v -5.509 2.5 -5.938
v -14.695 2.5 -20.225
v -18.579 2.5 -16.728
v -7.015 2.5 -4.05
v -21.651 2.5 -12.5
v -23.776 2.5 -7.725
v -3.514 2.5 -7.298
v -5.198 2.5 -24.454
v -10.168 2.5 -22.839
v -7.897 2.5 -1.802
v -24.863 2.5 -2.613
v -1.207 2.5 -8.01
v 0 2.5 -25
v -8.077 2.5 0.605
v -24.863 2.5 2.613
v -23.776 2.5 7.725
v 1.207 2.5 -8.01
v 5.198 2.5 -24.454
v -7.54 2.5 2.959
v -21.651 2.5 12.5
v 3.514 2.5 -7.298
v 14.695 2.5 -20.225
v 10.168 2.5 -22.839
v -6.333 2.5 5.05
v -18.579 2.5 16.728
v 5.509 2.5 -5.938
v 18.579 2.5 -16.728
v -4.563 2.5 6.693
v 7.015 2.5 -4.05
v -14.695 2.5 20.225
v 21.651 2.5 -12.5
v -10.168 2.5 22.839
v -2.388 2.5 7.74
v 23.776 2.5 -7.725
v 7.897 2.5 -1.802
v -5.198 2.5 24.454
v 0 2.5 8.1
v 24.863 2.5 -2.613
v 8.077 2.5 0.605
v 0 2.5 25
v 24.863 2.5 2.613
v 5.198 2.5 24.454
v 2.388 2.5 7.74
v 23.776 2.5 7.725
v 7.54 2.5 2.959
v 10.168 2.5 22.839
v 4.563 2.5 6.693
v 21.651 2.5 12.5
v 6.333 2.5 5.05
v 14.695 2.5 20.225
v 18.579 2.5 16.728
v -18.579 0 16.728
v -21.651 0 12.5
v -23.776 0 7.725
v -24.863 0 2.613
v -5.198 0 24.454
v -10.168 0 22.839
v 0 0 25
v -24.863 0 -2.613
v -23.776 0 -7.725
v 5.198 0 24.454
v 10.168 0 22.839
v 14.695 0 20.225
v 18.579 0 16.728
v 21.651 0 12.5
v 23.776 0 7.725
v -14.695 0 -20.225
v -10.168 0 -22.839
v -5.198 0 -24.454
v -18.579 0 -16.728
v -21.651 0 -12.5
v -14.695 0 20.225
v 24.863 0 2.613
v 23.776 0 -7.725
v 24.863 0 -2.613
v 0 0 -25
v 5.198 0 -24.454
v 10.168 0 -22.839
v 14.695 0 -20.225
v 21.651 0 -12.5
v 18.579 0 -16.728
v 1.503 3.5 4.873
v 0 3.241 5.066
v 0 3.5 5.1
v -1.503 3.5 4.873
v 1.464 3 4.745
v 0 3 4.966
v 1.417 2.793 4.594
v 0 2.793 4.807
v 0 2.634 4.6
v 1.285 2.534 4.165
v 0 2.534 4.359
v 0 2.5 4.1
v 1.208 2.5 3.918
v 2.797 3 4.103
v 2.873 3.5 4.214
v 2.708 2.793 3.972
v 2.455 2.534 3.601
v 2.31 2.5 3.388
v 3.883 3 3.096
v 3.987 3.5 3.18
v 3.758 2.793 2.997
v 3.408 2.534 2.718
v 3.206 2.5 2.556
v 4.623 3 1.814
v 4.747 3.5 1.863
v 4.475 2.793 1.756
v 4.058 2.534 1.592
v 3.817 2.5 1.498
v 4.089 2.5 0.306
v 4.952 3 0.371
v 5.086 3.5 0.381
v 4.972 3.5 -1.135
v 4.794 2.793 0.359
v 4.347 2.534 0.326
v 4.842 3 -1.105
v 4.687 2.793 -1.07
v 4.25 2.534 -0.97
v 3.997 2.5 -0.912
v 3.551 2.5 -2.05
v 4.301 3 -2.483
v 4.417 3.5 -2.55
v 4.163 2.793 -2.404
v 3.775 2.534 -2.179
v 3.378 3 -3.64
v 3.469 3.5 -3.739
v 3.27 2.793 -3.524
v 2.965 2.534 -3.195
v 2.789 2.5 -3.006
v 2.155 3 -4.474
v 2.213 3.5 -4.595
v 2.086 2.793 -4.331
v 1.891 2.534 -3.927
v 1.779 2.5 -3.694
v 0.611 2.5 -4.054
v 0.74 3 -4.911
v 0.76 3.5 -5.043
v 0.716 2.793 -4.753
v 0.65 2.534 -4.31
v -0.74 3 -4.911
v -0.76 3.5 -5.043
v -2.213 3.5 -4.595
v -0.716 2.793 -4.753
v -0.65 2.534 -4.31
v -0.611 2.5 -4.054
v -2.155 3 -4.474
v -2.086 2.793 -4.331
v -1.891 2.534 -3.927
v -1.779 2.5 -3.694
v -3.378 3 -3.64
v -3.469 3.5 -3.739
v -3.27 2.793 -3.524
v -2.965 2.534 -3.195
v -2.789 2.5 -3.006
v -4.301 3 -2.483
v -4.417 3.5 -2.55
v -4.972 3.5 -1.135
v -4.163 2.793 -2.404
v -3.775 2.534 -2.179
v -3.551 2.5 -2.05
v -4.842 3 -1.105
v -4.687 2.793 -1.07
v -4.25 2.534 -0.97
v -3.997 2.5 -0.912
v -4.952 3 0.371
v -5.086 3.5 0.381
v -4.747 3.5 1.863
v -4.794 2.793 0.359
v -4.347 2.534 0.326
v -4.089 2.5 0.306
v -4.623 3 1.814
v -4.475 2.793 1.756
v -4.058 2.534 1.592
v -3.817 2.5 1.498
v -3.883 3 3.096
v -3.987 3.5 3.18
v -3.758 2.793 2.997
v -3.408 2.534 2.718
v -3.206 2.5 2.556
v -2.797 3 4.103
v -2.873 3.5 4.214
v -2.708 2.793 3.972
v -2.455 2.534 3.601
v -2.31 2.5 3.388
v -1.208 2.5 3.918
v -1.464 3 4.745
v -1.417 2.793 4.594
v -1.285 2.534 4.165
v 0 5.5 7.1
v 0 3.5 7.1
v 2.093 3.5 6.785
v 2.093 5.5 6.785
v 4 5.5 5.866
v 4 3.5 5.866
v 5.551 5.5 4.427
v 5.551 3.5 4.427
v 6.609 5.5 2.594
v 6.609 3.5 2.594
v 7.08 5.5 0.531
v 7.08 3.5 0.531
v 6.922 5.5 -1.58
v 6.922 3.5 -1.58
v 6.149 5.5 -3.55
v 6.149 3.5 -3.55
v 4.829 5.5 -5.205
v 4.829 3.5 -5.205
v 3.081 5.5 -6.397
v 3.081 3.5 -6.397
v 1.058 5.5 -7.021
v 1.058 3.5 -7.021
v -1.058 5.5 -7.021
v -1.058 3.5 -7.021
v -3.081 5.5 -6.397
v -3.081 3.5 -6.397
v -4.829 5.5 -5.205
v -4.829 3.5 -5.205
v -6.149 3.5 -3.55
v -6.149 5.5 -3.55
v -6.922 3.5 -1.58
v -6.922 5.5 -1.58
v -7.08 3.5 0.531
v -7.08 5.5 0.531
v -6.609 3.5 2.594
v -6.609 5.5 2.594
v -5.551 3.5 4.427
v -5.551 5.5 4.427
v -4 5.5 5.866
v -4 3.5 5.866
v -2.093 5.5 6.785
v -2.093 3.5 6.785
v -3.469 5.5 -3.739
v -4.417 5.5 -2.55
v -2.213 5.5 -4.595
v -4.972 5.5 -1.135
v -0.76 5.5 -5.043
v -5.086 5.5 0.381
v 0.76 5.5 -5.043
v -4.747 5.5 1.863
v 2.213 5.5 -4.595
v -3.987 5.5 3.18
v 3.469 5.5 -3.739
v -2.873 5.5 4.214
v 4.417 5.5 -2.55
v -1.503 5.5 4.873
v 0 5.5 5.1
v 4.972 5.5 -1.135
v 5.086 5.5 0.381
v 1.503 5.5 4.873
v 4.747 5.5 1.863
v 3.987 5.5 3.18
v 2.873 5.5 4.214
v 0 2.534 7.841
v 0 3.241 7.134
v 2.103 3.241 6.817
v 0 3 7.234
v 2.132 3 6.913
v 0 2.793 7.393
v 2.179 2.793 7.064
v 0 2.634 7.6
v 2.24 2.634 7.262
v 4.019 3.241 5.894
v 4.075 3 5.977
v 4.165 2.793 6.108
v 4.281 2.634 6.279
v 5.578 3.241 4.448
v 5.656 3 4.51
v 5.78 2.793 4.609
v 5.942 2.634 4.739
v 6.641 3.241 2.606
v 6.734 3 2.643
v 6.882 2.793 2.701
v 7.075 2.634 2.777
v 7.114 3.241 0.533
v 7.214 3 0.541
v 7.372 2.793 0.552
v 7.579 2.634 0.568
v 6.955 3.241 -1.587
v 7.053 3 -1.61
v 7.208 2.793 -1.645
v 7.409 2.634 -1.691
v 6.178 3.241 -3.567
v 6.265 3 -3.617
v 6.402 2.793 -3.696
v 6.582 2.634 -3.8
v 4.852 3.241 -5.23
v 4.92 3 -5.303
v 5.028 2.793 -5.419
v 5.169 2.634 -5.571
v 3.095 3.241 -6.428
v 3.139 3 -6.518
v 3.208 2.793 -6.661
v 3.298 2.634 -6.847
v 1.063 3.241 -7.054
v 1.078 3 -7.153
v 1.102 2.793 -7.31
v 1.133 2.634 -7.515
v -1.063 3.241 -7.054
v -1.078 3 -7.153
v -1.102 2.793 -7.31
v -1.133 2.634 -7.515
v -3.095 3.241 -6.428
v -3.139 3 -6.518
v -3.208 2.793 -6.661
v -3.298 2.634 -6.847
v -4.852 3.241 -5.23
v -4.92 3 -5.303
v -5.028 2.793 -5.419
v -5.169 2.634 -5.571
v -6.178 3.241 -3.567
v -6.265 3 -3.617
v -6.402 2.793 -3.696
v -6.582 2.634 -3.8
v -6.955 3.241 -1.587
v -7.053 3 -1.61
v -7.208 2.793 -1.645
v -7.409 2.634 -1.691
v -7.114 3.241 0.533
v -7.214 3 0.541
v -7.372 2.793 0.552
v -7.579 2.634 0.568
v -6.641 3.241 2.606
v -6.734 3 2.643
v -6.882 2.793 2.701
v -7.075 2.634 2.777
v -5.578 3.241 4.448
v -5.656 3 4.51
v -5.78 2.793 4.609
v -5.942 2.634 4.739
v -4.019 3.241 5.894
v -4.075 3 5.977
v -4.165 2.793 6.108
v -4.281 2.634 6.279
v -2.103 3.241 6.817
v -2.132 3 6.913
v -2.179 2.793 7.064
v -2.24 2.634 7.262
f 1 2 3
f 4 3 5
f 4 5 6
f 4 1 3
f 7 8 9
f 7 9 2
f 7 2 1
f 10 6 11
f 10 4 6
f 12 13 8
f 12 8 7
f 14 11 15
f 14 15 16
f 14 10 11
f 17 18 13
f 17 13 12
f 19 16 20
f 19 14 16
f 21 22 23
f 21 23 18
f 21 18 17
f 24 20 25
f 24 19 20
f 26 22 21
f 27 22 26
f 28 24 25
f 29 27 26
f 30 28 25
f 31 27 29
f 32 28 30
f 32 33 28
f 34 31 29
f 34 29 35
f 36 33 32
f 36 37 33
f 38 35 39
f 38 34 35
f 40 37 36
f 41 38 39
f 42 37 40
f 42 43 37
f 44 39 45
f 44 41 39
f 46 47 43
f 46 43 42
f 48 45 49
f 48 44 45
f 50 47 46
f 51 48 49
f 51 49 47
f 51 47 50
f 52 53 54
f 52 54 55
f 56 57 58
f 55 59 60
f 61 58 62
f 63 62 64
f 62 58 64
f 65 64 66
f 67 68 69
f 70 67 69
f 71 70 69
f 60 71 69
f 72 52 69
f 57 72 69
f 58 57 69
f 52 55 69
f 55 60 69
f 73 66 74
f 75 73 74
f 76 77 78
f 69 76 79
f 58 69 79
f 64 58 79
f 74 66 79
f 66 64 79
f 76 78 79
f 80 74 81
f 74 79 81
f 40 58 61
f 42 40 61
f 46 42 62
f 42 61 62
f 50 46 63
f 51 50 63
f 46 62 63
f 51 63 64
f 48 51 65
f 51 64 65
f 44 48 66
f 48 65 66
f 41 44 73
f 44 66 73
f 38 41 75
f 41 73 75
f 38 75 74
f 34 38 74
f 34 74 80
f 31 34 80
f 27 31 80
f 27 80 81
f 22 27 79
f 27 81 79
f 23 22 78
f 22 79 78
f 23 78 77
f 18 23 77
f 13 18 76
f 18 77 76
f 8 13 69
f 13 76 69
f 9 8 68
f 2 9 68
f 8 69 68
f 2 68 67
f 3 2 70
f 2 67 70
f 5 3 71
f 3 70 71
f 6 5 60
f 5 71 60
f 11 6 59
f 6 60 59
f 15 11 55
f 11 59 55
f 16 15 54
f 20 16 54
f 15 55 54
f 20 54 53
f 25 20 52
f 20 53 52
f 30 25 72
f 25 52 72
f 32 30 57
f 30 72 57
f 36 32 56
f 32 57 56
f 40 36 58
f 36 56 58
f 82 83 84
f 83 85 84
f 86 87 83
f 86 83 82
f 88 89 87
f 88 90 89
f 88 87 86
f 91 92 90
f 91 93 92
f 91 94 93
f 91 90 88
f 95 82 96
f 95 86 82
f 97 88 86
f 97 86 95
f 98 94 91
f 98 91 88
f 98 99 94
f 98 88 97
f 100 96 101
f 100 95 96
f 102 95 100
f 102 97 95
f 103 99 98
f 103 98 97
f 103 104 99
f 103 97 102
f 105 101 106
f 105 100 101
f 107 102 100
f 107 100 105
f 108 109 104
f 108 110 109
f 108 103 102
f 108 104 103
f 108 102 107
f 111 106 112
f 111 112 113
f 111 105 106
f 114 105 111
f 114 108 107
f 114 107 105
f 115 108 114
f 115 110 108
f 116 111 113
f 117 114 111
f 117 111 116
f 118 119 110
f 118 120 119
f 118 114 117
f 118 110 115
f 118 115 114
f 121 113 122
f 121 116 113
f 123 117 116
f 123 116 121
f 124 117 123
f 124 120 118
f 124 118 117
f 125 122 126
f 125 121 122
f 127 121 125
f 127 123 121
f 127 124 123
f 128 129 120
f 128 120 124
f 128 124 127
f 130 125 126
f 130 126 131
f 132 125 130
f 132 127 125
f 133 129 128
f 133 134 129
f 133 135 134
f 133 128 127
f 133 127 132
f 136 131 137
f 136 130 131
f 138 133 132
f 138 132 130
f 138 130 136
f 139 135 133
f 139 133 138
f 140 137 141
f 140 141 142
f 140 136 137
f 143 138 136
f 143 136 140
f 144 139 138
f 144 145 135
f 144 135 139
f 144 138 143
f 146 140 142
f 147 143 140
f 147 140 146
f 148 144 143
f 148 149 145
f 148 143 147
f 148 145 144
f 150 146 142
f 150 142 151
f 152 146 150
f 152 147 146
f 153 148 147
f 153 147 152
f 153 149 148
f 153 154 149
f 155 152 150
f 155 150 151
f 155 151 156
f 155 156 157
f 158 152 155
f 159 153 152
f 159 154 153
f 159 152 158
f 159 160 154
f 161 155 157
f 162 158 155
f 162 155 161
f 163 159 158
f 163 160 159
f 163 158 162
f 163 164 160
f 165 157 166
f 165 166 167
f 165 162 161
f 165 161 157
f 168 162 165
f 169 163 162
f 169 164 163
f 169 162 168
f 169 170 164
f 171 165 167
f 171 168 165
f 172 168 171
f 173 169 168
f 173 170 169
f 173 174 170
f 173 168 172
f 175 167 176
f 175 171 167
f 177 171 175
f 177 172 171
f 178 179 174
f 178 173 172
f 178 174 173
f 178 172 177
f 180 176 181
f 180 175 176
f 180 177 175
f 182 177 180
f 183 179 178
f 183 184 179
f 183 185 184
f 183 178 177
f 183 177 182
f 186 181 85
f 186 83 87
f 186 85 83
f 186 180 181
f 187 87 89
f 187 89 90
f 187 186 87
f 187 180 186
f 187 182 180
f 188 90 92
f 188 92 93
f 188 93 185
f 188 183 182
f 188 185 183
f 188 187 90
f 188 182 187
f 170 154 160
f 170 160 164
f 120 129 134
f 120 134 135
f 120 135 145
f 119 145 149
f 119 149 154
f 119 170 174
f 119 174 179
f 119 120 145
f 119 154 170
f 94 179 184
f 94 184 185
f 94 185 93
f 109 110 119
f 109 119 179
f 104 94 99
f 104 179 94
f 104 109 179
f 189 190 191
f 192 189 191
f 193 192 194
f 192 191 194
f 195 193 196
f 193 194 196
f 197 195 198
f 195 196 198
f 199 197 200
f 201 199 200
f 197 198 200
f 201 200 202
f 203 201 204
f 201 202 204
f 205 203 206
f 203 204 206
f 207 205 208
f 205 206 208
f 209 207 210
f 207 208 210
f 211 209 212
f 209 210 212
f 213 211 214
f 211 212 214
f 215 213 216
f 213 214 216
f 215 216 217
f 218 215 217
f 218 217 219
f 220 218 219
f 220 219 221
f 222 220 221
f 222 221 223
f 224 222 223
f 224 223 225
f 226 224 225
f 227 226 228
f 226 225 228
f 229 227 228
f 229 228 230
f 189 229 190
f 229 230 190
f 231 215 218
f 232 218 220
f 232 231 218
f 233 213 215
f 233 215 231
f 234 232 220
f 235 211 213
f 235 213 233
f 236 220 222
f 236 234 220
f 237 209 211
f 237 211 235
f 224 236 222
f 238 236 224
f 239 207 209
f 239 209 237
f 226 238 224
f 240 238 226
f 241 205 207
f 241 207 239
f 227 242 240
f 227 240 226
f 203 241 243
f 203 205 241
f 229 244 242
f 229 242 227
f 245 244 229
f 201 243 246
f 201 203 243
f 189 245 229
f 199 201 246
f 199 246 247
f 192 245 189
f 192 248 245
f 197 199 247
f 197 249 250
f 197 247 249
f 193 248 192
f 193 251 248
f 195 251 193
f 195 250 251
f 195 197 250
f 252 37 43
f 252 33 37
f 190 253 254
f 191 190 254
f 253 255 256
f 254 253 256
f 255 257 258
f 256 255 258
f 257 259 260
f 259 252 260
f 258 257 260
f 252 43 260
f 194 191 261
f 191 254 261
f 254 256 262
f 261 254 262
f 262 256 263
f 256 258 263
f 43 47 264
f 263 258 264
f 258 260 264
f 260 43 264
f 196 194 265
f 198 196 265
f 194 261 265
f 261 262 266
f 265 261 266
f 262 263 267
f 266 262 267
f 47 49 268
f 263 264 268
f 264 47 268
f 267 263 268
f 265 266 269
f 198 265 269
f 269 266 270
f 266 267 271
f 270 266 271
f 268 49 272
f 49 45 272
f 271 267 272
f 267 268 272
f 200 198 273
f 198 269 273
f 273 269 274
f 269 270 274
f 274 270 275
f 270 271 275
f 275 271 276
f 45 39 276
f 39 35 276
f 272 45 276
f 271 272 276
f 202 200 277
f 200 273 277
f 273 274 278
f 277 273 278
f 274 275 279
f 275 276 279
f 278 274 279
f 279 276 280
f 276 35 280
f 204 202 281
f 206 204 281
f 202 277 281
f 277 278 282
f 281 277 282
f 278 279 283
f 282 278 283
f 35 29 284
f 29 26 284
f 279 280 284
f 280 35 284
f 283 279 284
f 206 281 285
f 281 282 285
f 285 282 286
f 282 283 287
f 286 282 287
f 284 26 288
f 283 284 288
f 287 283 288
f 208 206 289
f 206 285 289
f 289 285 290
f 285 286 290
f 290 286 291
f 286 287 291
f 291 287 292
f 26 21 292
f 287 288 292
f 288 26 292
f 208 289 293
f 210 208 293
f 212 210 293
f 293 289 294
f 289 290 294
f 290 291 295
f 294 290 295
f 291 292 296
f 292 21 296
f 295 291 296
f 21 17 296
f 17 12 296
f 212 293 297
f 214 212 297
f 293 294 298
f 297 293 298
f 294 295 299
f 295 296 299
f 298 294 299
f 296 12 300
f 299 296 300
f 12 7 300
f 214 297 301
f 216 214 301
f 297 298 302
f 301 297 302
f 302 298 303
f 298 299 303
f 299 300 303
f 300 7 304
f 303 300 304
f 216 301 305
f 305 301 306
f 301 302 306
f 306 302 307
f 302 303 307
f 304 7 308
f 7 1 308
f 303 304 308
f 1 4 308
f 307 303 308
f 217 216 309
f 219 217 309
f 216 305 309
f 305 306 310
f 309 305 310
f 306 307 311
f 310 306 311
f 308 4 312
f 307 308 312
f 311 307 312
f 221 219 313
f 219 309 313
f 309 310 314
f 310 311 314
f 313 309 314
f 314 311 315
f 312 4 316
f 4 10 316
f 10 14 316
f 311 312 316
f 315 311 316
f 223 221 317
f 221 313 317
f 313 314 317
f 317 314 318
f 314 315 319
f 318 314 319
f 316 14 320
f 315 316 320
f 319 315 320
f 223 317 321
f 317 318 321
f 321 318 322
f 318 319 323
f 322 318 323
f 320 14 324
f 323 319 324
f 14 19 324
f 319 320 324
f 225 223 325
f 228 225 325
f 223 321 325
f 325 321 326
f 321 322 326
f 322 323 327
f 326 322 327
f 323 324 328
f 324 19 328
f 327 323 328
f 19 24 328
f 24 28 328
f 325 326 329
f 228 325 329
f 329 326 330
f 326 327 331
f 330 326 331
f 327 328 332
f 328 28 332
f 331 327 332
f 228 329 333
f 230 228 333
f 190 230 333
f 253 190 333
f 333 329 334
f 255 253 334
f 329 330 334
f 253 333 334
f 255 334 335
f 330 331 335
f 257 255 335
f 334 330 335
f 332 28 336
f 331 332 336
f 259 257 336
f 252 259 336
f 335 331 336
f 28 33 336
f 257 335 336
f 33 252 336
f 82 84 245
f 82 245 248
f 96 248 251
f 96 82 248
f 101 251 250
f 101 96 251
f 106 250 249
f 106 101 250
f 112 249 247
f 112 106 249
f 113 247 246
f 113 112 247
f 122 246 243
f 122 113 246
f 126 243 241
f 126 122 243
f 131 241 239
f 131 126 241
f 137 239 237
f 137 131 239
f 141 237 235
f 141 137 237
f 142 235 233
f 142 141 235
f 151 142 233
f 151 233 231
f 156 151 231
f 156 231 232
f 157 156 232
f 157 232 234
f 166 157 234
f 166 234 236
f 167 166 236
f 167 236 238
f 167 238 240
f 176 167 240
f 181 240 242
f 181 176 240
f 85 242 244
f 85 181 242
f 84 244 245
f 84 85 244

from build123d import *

# Parameters (mm, degrees)
SKETCH2_R           = 25
SKETCH2_R_2         = 5.1
BOSS_EXTRUDE1_DEPTH = 2.5
SKETCH3_R           = 7.1
SKETCH3_R_2         = 5.1
BOSS_EXTRUDE2_DEPTH = 3
FILLET1_R           = 1
FILLET2_R           = 1


with BuildPart() as part:
    # Sketch2 → Boss-Extrude1 (new body)
    # profile 1 of 2: a face of its own
    with BuildSketch(Plane(origin=(0, 0, 0), x_dir=(1, 0, 0), z_dir=(0, 1, 0))):
        with Locations(Location((0, 0, 0), (0, 0, 270))):
            Circle(SKETCH2_R)
        Circle(SKETCH2_R_2, mode=Mode.SUBTRACT)
    # profile 2 of 2: a face of its own
    with BuildSketch(Plane(origin=(0, 0, 0), x_dir=(1, 0, 0), z_dir=(0, 1, 0))):
        Circle(SKETCH2_R_2)
    extrude(amount=BOSS_EXTRUDE1_DEPTH)

    # Sketch3 → Boss-Extrude2 (add)
    with BuildSketch(Plane(origin=(0, 2.5, 0), x_dir=(1, 0, 0), z_dir=(0, 1, 0))):
        with Locations(Location((0, 0, 0), (0, 0, 270))):
            Circle(SKETCH3_R)
        with Locations(Location((0, 0, 0), (0, 0, 270))):
            Circle(SKETCH3_R_2, mode=Mode.SUBTRACT)
    extrude(amount=BOSS_EXTRUDE2_DEPTH)

    # Fillet1
    fillet1_edges = [part.edges().sort_by_distance(p)[0] for p in [
        (0, 2.5, -5.1),
    ]]
    fillet(fillet1_edges, radius=FILLET1_R)

    # Fillet2
    fillet2_edges = [part.edges().sort_by_distance(p)[0] for p in [
        (0, 2.5, -7.1),
    ]]
    fillet(fillet2_edges, radius=FILLET2_R)


solid = part.part
